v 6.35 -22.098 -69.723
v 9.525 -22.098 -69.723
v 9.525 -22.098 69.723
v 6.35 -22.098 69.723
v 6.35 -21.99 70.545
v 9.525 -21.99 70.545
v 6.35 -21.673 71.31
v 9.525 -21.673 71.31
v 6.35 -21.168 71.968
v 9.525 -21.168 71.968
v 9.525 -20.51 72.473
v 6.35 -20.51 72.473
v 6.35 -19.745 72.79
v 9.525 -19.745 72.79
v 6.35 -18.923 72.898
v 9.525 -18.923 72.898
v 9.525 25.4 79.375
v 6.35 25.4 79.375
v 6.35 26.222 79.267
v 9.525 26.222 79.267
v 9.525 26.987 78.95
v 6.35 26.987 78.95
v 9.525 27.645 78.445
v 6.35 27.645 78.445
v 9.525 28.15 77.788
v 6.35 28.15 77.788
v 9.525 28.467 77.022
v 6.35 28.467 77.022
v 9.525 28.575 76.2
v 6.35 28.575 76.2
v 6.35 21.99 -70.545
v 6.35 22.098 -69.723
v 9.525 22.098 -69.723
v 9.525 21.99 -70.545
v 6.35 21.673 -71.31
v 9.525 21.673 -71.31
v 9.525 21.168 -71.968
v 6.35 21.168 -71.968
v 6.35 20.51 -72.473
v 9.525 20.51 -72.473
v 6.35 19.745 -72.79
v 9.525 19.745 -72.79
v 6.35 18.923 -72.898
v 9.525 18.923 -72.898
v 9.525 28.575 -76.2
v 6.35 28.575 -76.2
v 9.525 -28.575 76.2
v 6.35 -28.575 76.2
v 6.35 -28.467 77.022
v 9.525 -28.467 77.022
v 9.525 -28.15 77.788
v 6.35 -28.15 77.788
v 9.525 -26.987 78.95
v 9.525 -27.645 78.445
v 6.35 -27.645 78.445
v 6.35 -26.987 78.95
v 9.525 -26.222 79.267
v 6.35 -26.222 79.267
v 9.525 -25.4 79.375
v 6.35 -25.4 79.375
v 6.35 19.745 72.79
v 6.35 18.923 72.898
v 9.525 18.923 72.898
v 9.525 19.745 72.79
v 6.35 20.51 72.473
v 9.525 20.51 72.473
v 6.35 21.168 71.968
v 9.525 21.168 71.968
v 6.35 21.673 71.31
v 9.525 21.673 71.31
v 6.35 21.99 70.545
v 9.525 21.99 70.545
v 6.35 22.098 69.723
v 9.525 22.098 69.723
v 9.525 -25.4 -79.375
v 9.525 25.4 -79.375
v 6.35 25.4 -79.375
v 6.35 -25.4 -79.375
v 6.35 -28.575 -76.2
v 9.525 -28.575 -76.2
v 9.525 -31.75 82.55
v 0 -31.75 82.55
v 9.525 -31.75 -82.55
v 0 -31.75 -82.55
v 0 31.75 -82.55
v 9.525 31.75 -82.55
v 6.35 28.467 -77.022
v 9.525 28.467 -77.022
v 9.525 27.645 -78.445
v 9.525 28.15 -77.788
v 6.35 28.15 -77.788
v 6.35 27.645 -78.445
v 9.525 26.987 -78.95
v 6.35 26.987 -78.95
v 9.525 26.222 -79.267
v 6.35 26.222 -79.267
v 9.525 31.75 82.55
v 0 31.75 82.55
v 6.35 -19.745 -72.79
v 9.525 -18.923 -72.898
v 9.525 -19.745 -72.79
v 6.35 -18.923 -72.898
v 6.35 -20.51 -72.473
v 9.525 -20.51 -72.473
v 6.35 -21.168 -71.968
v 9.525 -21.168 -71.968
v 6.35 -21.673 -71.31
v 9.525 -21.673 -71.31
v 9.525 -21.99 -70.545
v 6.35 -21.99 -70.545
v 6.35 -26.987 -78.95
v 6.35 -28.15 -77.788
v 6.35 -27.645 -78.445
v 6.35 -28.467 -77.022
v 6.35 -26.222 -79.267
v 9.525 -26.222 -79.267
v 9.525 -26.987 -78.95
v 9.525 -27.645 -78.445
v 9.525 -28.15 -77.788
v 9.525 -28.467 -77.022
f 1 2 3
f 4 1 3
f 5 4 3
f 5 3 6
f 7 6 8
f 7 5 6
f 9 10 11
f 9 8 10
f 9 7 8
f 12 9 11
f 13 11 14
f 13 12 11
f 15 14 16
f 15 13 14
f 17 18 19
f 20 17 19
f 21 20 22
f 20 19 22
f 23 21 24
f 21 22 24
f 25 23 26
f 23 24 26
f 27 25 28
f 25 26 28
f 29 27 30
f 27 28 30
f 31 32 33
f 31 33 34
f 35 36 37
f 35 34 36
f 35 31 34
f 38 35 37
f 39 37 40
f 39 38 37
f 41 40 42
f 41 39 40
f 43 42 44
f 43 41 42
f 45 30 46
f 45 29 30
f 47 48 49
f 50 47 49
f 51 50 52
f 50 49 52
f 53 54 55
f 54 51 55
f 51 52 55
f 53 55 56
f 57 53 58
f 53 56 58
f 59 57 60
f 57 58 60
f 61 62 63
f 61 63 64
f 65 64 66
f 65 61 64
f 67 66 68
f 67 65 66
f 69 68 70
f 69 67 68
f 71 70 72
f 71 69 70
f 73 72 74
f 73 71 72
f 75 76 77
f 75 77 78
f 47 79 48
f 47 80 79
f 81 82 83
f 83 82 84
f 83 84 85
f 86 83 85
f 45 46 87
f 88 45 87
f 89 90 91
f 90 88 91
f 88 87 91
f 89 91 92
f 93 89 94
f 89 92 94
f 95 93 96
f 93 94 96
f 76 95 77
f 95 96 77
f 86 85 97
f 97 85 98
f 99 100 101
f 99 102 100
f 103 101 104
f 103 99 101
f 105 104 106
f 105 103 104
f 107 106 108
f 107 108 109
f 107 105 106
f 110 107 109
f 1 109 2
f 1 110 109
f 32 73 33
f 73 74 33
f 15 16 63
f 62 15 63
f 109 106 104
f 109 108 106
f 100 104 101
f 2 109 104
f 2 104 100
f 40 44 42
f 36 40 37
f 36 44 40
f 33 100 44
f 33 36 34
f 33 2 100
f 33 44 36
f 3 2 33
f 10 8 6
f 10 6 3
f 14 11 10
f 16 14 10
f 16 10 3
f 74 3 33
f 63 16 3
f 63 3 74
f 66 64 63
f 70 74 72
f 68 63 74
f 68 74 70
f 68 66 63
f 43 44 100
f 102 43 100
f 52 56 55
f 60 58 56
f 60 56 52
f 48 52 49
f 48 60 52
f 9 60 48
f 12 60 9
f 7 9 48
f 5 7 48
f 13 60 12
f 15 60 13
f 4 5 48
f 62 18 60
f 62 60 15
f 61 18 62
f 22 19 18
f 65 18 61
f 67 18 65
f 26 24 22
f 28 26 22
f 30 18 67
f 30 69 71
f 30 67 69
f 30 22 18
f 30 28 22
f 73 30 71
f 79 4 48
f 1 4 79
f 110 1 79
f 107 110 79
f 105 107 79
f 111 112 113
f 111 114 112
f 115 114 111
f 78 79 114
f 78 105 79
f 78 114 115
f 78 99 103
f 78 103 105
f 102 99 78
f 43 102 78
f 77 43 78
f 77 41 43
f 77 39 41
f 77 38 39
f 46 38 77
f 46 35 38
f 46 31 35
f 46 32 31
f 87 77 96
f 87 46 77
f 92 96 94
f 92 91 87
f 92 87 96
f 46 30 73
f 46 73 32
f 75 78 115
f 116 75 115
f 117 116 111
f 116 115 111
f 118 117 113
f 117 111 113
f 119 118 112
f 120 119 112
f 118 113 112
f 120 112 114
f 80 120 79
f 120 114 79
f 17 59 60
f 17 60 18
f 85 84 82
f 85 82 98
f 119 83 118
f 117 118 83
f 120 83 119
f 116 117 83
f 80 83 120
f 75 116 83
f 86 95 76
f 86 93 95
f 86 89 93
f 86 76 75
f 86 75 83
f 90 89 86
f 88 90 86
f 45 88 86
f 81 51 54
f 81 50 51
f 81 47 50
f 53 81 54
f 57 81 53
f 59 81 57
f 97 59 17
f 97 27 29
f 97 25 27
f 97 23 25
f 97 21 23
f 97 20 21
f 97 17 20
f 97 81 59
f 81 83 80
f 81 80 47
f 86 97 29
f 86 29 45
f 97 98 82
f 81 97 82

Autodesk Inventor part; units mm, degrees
ref_plane "YZ Plane" through (0, 0, 0) normal (1, 0, 0) x (0, 1, 0)
ref_plane "XZ Plane" through (0, 0, 0) normal (0, 1, 0) x (-1, 0, 0)
ref_plane "XY Plane" through (0, 0, 0) normal (0, 0, 1) x (1, 0, 0)
sketch "Sketch1" plane through (0, 0, 0) normal (1, 0, 0) x (0, 1, 0)
  line L0 (31.75, 82.55) -> (-31.75, 82.55)
  line L1 (-31.75, 82.55) -> (-31.75, -82.55)
  line L2 (-31.75, -82.55) -> (31.75, -82.55)
  line L3 (31.75, -82.55) -> (31.75, 82.55)
  point P0 (0, 0)
  point P1 (31.75, 0)
  point P2 (0, 82.55)
  dimension "d0" = 165.1
  dimension "d1" = 63.5
extrude "Extrusion1" add sketch "Sketch1" along normal blind 9.525
sketch "Sketch3" plane through (9.525, 0, 0) normal (1, 0, 0) x (0, 0, -1)
  line L0 (72.898, -22.098) -> (-72.898, -22.098)
  line L1 (-72.898, -22.098) -> (-72.898, 22.098)
  line L2 (-72.898, 22.098) -> (72.898, 22.098)
  line L3 (72.898, 22.098) -> (72.898, -22.098)
  line L4 (72.898, -22.098) -> (-72.898, 22.098) construction
  line L5 (-72.898, -22.098) -> (72.898, 22.098) construction
  line L6 (79.375, -28.575) -> (-79.375, -28.575)
  line L7 (-79.375, -28.575) -> (-79.375, 28.575)
  line L8 (-79.375, 28.575) -> (79.375, 28.575)
  line L9 (79.375, 28.575) -> (79.375, -28.575)
  line L10 (79.375, -28.575) -> (-79.375, 28.575) construction
  line L11 (-79.375, -28.575) -> (79.375, 28.575) construction
  point P0 (0, 0)
  point P1 (0, 0)
  point P2 (0, 0)
  dimension "d16" = 145.796
  dimension "d17" = 44.196
  dimension "d18" = 6.477
  dimension "d19" = 6.477
extrude "Extrusion3" cut sketch "Sketch3" against normal blind 3.175
fillet "Fillet1" radius 3.175 8 edges at (7.9375, -28.575, 79.375) (7.9375, 28.575, 79.375) (7.9375, 28.575, -79.375) (7.9375, -28.575, -79.375) (7.9375, -22.098, 72.898) (7.9375, 22.098, 72.898) (7.9375, 22.098, -72.898) (7.9375, -22.098, -72.898)
equation "\"d0\" = tubeWidth + 2 * plateOverhang"
equation "\"d1\" = tubeHeight + 2 * plateOverhang"
equation "\"d2\" = blankCapThickness"
equation "\"d16\" = -2 * tubeWallThickness + tubeWidth - 2 * tubePlateClearance"
equation "\"d17\" = -2 * tubeWallThickness + tubeHeight - 2 * tubePlateClearance"
equation "\"d18\" = tubeWallThickness + tubePlateClearance + moatWidth"
equation "\"d19\" = tubeWallThickness + tubePlateClearance + moatWidth"
equation "\"d12\" = moatDepth"
equation "\"tubeHeight\" = 50.8"
equation "\"tubeWidth\" = 152.4"
equation "\"tubeLength\" = 304.8"
equation "\"tubeWallThickness\" = 3.175"
equation "\"plateOverhang\" = 6.35"
equation "\"moatWidth\" = 3.175"
equation "\"tubePlateClearance\" = 0.127"
equation "\"moatDepth\" = 3.175"
equation "\"blankCapThickness\" = 9.525"
equation "\"fiberClearance\" = 0"
equation "\"oRingID\" = 22.2504"
equation "\"fiberDiameter\" = 1"
equation "\"sensorHolderThickness\" = 12.7"
equation "\"oRingGrooveWidth\" = 2.54"
equation "\"longHoleSpacing\" = 30.48"
equation "\"sensorHolderDiameter\" = 50.8"
equation "\"shortHoleSpacing\" = 21.59"
equation "\"glassTubeClearance\" = 0.19844"
equation "\"glassTubeDiameter\" = 12.7"
equation "\"sensorCapThickness\" = 12.7"
equation "\"oRingGrooveDepth\" = 1.2446"
equation "\"glassTubeID\" = 7.874"
equation "\"glassTubeLength\" = 279.4"
equation "\"sensorBoardHoleSpacing\" = 19"
properties part number "plateEnd" material "Aluminum 6061"
